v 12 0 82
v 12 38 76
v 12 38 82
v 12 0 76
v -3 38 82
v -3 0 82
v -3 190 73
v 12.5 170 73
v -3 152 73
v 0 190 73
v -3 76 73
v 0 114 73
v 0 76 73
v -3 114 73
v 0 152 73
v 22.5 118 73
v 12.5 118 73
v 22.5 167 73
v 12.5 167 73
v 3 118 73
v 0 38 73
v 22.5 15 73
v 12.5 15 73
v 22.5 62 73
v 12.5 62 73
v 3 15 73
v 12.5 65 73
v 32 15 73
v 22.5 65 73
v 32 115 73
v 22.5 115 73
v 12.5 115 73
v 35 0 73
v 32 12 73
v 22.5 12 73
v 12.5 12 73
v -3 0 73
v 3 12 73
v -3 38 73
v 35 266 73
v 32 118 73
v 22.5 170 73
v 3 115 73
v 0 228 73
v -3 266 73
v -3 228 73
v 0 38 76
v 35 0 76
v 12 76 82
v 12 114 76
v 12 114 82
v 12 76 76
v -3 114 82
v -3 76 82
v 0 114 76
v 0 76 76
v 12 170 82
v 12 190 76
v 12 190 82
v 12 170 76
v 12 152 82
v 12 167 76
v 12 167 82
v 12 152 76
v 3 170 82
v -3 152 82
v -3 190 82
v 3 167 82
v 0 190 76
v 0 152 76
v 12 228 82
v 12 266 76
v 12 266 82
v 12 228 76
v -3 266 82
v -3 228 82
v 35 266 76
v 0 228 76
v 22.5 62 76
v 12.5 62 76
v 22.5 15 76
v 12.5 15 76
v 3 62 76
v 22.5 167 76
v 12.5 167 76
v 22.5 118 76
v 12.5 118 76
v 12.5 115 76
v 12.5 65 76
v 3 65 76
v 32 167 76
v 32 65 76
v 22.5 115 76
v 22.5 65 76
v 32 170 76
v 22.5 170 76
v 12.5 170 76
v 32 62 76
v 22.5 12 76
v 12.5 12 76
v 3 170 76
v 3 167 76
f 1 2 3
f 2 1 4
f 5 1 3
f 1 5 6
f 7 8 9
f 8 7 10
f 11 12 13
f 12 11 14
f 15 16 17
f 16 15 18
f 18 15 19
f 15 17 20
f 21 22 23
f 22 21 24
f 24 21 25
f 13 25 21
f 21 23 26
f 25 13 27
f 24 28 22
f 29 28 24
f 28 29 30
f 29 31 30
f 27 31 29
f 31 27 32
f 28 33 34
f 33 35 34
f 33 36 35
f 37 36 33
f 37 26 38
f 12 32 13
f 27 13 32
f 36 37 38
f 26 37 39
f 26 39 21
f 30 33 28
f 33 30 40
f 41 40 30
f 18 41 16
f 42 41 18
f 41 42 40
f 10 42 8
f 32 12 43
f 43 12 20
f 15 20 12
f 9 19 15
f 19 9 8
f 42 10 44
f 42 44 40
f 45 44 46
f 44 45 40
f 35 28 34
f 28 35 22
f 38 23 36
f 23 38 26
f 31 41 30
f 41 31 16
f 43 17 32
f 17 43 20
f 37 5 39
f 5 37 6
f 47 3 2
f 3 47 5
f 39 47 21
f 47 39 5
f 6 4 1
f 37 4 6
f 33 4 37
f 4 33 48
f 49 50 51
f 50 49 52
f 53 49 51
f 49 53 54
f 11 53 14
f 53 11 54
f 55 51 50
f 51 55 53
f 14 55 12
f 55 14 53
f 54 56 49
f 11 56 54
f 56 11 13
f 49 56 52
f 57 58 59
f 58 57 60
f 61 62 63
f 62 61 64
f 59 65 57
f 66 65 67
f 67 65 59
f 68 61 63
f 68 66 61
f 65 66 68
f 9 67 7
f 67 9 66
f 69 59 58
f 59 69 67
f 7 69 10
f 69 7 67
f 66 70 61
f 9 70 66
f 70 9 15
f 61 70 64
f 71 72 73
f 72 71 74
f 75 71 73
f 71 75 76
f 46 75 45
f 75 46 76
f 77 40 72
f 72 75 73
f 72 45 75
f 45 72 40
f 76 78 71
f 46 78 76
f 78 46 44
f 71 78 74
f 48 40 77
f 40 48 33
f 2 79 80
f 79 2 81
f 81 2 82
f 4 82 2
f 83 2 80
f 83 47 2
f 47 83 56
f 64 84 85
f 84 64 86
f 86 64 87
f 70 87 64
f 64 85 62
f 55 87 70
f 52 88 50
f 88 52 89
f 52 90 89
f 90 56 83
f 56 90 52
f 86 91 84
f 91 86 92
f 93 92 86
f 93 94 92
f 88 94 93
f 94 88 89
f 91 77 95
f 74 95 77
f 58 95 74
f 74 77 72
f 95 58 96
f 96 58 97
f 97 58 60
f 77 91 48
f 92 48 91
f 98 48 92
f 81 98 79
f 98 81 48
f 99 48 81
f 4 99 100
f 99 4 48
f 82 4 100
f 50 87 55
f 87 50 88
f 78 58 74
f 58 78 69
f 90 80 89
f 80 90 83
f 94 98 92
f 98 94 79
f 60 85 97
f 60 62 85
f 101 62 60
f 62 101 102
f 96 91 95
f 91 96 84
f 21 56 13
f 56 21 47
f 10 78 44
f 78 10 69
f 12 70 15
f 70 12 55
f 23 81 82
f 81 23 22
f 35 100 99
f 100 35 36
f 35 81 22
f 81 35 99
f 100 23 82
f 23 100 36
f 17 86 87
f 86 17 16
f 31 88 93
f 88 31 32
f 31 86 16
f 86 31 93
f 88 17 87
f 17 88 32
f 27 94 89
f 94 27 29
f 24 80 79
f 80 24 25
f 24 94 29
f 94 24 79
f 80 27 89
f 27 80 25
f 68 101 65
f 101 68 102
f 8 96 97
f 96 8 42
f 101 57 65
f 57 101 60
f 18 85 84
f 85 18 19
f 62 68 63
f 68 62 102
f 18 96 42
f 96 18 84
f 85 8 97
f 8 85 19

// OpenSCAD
zyxelNasColor = [
    (26 / 255),
    (188 / 255),
    (156 / 255)
];
nasWidth = 124;
nasHeight = 164;
nasDepth = 206;
nasBackCableSapce = 42;

switchColor = [
    (155 / 255),
    (89 / 255),
    (182 / 255)
];
switchWidth = 117;
switchHeight = 26;
switchDepth = 65;
switchBackCableSapce = 60;
switchLeftCableSapce = 14;

raspPiColor = [
    (231 / 255),
    (76 / 255),
    (60 / 255)
];
raspPiWidth = 68;
raspPiHeight = 45;
raspPiDepth = 104;
raspPiBackCableSapce = 40;
raspPiRightCableSapce = 30;

ankerHubColor = [
    (46 / 255),
    (204 / 255),
    (113 / 255)
];
ankerHubWidth = 26;
ankerHubHeight = 70;
ankerHubDepth = 100;
ankerHubBackCableSapce = 64;

networkSwitchColor = [
    (52 / 255),
    (73 / 255),
    (94 / 255)
];
networkSwitchWidth = 29;
networkSwitchHeight = 158;
networkSwitchDepth = 102;
networkSwitchBackCableSapce = 45;
networkSwitchFrontCableSapce = 50;

frontCoverColor = [
    (231 / 255),
    (76 / 255),
    (60 / 255)
];

module zxyelNas() {
    totalDepth = nasDepth + nasBackCableSapce;
    
    color(zyxelNasColor)
    
    cube([nasWidth, nasDepth, nasHeight]);
}

module hdmiSwitch() {
    totalWidth = switchWidth + switchLeftCableSapce;
    totalDepth = switchDepth + switchBackCableSapce;
    
    color(switchColor)
    translate([switchLeftCableSapce, 0, 0]) {
        cube([switchWidth, switchDepth, switchHeight]);
    }
}

module raspPi() {
    totalWidth = raspPiWidth + raspPiRightCableSapce;
    totalDepth = raspPiDepth + raspPiBackCableSapce;
    
    color(raspPiColor)
    
    cube([totalWidth, totalDepth, raspPiHeight]);
}

module ankerHub() {
    
    color(ankerHubColor)
    
    cube([ankerHubWidth, ankerHubDepth, ankerHubHeight]);
}

module networkSwitch() {
    totalDepth = networkSwitchDepth + networkSwitchBackCableSapce + networkSwitchFrontCableSapce;
    
    color(networkSwitchColor)
    translate([0, networkSwitchFrontCableSapce, 0]) {
        cube([networkSwitchWidth, networkSwitchDepth, networkSwitchHeight]);
    }
}

acrylicThickness = 3;
itemIdentation = 12 + acrylicThickness;

leftThickness = acrylicThickness + networkSwitchWidth + acrylicThickness;

rightThickness = switchWidth + switchLeftCableSapce + acrylicThickness;

boxWidth = leftThickness + rightThickness;
boxDepth = 266;
boxHeight = acrylicThickness + nasHeight + acrylicThickness + switchHeight + acrylicThickness + raspPiHeight + 16;

module base() {
    cube([boxWidth, boxDepth, acrylicThickness]);
}

module left() {
    cube([acrylicThickness, boxDepth, boxHeight]);
}

module ankerHubHolder(extendTeeth = false) {
    numberOfTeeth = 5;
    totalTeethHeight = ankerHubHeight + (acrylicThickness * 2);
    toothHeight = totalTeethHeight / numberOfTeeth;
    
    teethWidth = extendTeeth ? (acrylicThickness * 3) : 0;
    
    union() {
        difference() {
             translate([-(teethWidth / 2), 0, acrylicThickness]) {
                color(frontCoverColor) cube([networkSwitchWidth + (2 * acrylicThickness) + teethWidth, acrylicThickness, ankerHubHeight]);
             }
            
            translate([((networkSwitchWidth - (ankerHubWidth - 8)) / 2 + acrylicThickness), -acrylicThickness, 2 + acrylicThickness]) {
                cube([ankerHubWidth - 8, acrylicThickness * 3, ankerHubHeight - 2 - 8]);
            }
            
            teethLeftX = -teethWidth - acrylicThickness;
            for(zPosition = [0 : 2 : numberOfTeeth]) {
                translate([teethLeftX, - acrylicThickness, zPosition * toothHeight]) {
                    cube([teethWidth + (acrylicThickness * 2), acrylicThickness * 3, toothHeight]);
                }
            }
            
            teethRightX = ankerHubWidth + (acrylicThickness * 2);
            for(zPosition = [0 : 2 : numberOfTeeth]) {
                translate([teethRightX, - acrylicThickness, zPosition * toothHeight]) {
                    cube([teethWidth + (acrylicThickness * 2), acrylicThickness * 3, toothHeight]);
                }
            }
        }
        
        translate([(networkSwitchWidth / 2) - (10 / 2) + acrylicThickness, 0, -teethWidth]) {
            color(frontCoverColor) cube([10, acrylicThickness, teethWidth + acrylicThickness]);
        }
        
        translate([(networkSwitchWidth / 2) - (10 / 2) + acrylicThickness, 0, ankerHubHeight + acrylicThickness]) {
            color(frontCoverColor) cube([10, acrylicThickness, teethWidth + acrylicThickness]);
        }
    }
}

module ankerHubFrontBack(extendTeeth = false) {
    // Anker Hub Front    
    translate([0, itemIdentation - acrylicThickness, 0]) {
        ankerHubHolder(extendTeeth);
    }
    
    // Anker Hub Back
    translate([0, itemIdentation + ankerHubDepth, 0]) {
        ankerHubHolder(extendTeeth);
    }
}

module networkSwitchHolder(extendTeeth = false) {
    numberOfTeeth = 7;
    totalTeethHeight = boxHeight - ankerHubHeight;
    toothHeight = totalTeethHeight / numberOfTeeth;
    
    teethWidth = extendTeeth ? (acrylicThickness * 3) : 0;
    
    difference() {
        translate([-(teethWidth / 2), 0, acrylicThickness]) {
            color(frontCoverColor) cube([
                networkSwitchWidth + (2 * acrylicThickness) + teethWidth,
                acrylicThickness,
                boxHeight - ankerHubHeight - acrylicThickness + teethWidth
            ]);
        }
        
        // Cut out the middle
        translate([(networkSwitchWidth / 2) - ((networkSwitchWidth - 4) / 2) + acrylicThickness, -acrylicThickness, 12 + acrylicThickness]) {
            cube([networkSwitchWidth - 4, acrylicThickness * 3, networkSwitchHeight - 24]);
        }
        
        // Cut out the top
        translate([(networkSwitchWidth / 2) - (18 / 2) + acrylicThickness, -acrylicThickness, (((boxHeight - ankerHubHeight) - networkSwitchHeight) / 2) - 9 + networkSwitchHeight]) {
            cube([18, acrylicThickness * 3, 26 + teethWidth]);
        }
        
        teethLeftX = -teethWidth - acrylicThickness;
        for(zPosition = [0 : 2 : numberOfTeeth]) {
            translate([teethLeftX, - acrylicThickness, zPosition * toothHeight]) {
                cube([teethWidth + (acrylicThickness * 2), acrylicThickness * 3, toothHeight]);
            }
        }
        
        teethRightX = networkSwitchWidth + acrylicThickness;
        for(zPosition = [0 : 2 : numberOfTeeth]) {
            translate([teethRightX, - acrylicThickness, zPosition * toothHeight]) {
                cube([teethWidth + (acrylicThickness * 2), acrylicThickness * 3, toothHeight]);
            }
        }
        
        translate([teethLeftX, - acrylicThickness, numberOfTeeth * toothHeight]) {
            cube([teethWidth + (acrylicThickness * 2), acrylicThickness * 3, toothHeight]);
        }
        translate([teethRightX, - acrylicThickness, numberOfTeeth * toothHeight]) {
            cube([teethWidth + (acrylicThickness * 2), acrylicThickness * 3, toothHeight]);
        }
    }
    
    translate([(networkSwitchWidth / 2) - (10 / 2) + acrylicThickness, 0, -teethWidth]) {
        color(frontCoverColor) cube([10, acrylicThickness, acrylicThickness + teethWidth]);
    }
}

module networkSwitchFrontBack(extendTeeth) {
    teethHeight = networkSwitchHeight + (acrylicThickness * 2);
    numberOfTeeth = teethHeight / 7;
    
    // Network Switch Front
    translate([0, networkSwitchFrontCableSapce + itemIdentation - acrylicThickness, ankerHubHeight + acrylicThickness]) {
        networkSwitchHolder(extendTeeth);
    }
    
    // Network Switch Back
    translate([0, networkSwitchFrontCableSapce + itemIdentation + networkSwitchDepth, ankerHubHeight + acrylicThickness]) {
        networkSwitchHolder(extendTeeth);
    }
}

module leftFirstShelf() {
    extendTeeth = true;
    numberOfTeeth = 7;
    totalTeethDepth = boxDepth;
    toothDepth = totalTeethDepth / numberOfTeeth;
    
    teethWidth = extendTeeth ? (acrylicThickness * 3) : 0;
    
    difference() {
        translate([0, 0, acrylicThickness + ankerHubHeight]) {
            cube([networkSwitchWidth + (acrylicThickness * 2), boxDepth, acrylicThickness]);
            
            teethLeftX = -teethWidth - acrylicThickness;
            for(yPosition = [0 : 2 : numberOfTeeth]) {
                translate([- acrylicThickness, yPosition * toothDepth, 0]) {
                    cube([teethWidth + (acrylicThickness * 2), toothDepth, acrylicThickness * 3]);
                }
            }
        }
        
        ankerHubFrontBack(true);
    
        networkSwitchFrontBack(true);
    }
    
    // ankerHubFrontBack();
    
    // networkSwitchFrontBack();
}

module rightFirstShelf() {
    translate([leftThickness, 0, acrylicThickness + nasHeight]) {
        cube([rightThickness, boxDepth, acrylicThickness]);
    }
}

module rightSecondShelf() {
    translate([leftThickness, 0, acrylicThickness + nasHeight + acrylicThickness + switchHeight]) {
        cube([rightThickness, boxDepth, acrylicThickness]);
    }
}

/** difference() {
    left();
    
    ankerHubFrontBack(true);
    networkSwitchFrontBack(true);
}

difference() {
    translate([acrylicThickness + networkSwitchWidth, 0, 0]) {
        left();
    }
    
    ankerHubFrontBack(true);
    networkSwitchFrontBack(true);
}**/

leftFirstShelf();

/**translate([leftThickness + switchWidth + switchLeftCableSapce, 0, 0]) {
    left();
}

difference() {
    base();
    ankerHubFrontBack(true);
}

rightFirstShelf();
rightSecondShelf();

translate([0, 0, boxHeight]) {
   base();
}**/


/** 
translate([acrylicThickness, itemIdentation, acrylicThickness]) {
    ankerHub();
}

translate([acrylicThickness, itemIdentation, acrylicThickness + ankerHubHeight + acrylicThickness]) {
    networkSwitch();
}

translate([leftThickness, itemIdentation,acrylicThickness]) {
    zxyelNas();
}

translate([leftThickness, itemIdentation, acrylicThickness + nasHeight + acrylicThickness]) {
    hdmiSwitch();
}

translate([leftThickness, itemIdentation, acrylicThickness + nasHeight + acrylicThickness + switchHeight + acrylicThickness]) {
    raspPi();
}**/
